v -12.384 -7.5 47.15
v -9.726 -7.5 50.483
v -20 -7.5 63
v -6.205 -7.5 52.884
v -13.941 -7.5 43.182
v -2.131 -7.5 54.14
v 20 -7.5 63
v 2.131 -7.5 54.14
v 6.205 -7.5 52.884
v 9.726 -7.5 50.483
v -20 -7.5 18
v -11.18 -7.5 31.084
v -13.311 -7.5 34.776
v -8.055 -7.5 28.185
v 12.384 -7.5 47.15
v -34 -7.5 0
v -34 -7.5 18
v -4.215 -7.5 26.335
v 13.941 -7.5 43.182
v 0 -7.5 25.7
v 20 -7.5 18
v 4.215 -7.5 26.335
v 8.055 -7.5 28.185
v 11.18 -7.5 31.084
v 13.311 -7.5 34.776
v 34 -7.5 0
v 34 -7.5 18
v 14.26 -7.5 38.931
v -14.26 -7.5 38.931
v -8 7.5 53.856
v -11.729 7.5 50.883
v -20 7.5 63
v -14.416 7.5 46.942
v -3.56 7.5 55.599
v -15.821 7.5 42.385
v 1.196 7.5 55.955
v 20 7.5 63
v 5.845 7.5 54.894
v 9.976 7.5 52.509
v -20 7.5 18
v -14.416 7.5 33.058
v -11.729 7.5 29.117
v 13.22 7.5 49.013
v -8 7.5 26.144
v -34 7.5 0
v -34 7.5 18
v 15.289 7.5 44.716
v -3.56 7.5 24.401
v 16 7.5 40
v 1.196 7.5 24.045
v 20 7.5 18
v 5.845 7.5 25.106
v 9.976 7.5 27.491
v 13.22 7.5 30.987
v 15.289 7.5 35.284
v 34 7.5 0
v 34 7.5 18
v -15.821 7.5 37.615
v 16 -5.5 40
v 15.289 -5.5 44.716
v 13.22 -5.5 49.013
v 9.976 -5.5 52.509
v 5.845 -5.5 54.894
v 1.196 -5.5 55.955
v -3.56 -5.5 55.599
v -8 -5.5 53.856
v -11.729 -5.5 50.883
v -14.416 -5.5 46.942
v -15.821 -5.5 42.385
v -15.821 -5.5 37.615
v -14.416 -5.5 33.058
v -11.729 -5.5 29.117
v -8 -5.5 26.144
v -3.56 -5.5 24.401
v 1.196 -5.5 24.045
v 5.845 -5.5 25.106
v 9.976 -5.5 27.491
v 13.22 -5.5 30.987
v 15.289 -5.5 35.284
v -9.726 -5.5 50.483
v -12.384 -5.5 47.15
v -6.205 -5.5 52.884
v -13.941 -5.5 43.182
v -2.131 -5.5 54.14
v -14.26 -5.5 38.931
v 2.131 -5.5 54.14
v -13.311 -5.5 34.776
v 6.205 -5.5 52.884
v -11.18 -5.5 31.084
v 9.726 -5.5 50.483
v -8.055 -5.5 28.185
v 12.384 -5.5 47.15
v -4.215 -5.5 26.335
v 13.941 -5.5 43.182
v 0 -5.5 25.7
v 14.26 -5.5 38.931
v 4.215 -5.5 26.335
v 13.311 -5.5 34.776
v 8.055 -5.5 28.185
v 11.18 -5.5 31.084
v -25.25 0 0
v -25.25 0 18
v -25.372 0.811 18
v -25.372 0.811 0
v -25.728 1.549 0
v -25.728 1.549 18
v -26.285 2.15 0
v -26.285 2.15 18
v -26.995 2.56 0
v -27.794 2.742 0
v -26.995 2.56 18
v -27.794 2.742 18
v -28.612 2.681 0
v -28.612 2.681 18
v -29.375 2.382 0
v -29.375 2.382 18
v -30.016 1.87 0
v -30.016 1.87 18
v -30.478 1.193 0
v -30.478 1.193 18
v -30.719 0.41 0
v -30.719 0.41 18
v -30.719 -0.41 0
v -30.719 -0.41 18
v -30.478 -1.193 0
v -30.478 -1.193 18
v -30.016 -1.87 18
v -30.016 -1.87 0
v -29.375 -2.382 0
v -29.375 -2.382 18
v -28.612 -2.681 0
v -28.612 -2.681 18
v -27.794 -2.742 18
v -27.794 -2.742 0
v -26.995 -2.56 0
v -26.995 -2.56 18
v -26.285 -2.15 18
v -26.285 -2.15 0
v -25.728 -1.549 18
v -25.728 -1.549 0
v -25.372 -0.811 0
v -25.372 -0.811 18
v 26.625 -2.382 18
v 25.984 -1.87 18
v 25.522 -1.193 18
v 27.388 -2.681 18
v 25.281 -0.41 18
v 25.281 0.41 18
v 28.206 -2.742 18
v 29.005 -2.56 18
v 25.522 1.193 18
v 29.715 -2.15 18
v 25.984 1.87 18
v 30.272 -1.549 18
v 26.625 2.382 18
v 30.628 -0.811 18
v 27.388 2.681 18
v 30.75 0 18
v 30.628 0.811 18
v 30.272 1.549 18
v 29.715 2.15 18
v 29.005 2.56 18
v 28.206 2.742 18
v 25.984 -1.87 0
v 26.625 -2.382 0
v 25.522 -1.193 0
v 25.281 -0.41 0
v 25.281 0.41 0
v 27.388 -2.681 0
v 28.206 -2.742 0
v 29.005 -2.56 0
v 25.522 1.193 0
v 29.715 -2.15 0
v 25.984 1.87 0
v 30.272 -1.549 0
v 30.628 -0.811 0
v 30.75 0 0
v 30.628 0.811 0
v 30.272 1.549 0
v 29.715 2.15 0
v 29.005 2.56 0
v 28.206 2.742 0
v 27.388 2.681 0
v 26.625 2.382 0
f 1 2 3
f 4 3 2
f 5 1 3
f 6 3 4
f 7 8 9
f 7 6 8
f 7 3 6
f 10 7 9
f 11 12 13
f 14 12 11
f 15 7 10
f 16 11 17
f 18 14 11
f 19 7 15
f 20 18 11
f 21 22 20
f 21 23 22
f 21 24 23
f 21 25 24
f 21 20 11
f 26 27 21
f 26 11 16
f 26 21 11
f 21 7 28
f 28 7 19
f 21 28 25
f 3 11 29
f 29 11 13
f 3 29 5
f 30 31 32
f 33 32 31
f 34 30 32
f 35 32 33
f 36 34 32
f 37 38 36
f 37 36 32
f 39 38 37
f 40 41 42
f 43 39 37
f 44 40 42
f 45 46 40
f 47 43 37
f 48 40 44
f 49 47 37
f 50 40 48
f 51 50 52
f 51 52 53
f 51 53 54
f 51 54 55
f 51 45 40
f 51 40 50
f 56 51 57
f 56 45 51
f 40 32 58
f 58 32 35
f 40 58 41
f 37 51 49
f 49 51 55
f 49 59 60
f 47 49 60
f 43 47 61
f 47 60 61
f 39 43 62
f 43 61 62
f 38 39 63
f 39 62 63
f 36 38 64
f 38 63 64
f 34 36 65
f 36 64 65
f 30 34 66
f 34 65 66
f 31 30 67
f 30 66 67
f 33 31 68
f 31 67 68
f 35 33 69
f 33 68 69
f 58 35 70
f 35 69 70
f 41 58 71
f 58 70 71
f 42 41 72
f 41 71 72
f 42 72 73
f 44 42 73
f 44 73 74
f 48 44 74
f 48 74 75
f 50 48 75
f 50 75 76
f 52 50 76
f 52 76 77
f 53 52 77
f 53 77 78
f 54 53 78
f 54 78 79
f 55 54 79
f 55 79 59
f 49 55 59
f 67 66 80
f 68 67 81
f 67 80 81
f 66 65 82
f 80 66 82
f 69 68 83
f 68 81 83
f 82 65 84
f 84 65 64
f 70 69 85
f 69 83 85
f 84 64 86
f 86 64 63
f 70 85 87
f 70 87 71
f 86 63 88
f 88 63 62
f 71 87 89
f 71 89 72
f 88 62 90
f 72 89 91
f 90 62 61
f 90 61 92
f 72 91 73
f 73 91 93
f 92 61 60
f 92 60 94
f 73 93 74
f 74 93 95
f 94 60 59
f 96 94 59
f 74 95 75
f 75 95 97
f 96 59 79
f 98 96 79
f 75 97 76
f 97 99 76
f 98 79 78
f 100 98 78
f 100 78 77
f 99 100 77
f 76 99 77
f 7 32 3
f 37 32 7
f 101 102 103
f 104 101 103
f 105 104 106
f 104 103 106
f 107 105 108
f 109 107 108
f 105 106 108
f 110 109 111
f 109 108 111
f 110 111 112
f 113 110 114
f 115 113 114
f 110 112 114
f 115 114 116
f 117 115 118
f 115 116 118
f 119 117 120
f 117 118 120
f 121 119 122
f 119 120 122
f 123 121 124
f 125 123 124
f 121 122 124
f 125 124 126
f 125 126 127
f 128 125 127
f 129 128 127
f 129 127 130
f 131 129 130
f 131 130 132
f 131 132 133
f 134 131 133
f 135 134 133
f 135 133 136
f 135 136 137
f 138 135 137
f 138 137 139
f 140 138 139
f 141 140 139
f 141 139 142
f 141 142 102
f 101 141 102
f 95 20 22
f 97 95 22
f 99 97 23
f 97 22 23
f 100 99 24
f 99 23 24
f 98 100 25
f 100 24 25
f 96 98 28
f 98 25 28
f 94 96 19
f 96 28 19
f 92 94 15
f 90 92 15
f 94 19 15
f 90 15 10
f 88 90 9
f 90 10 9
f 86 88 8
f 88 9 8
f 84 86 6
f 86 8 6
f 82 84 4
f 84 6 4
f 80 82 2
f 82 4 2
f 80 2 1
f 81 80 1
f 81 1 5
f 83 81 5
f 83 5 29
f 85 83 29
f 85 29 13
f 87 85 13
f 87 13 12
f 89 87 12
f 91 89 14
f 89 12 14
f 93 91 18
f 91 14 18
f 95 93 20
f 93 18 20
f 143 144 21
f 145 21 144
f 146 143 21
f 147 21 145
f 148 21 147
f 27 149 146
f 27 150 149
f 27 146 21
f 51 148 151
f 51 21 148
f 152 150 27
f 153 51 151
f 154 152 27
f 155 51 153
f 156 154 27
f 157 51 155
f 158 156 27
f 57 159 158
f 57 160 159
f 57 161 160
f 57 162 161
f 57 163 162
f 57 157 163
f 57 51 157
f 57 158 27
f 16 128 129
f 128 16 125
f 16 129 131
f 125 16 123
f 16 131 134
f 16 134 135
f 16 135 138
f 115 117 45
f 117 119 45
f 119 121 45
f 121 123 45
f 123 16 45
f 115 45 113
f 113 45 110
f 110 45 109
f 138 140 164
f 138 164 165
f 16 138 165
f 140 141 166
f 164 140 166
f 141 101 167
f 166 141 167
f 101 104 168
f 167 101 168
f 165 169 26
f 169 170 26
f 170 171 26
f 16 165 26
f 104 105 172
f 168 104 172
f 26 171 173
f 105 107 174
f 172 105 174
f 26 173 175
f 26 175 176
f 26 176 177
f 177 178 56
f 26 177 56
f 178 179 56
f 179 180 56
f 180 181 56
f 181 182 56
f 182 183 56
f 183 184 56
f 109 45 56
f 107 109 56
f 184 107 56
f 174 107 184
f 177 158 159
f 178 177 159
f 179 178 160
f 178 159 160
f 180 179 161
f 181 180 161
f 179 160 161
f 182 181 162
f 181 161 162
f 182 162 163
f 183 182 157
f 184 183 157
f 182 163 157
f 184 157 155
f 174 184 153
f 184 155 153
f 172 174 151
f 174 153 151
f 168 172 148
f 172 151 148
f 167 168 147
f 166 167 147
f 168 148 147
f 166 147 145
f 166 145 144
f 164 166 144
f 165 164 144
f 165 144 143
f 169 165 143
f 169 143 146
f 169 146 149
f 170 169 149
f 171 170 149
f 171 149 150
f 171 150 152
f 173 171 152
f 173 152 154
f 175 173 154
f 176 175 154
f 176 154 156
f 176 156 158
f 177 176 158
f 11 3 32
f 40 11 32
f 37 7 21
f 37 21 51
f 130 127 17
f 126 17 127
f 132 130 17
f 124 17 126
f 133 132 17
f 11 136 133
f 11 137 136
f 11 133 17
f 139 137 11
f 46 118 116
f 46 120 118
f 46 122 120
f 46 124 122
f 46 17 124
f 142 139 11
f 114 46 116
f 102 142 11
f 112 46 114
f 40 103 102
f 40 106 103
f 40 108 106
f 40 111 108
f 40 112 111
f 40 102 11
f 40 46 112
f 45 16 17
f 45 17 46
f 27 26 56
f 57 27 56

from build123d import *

# Parameters (mm, degrees)
SKETCH_1_W          = 68
SKETCH_1_H          = 15
EXTRUDE_1_DEPTH     = 18
SKETCH_2_W          = 40
SKETCH_2_H          = 15
EXTRUDE_2_DEPTH     = 45
SKETCH_3_R          = 16
CUT_EXTRUDE_1_DEPTH = 43
SKETCH_4_R          = 16
SKETCH_4_R_2        = 14.3
EXTRUDE_3_DEPTH     = 2
SKETCH_5_R          = 2.75
CUT_EXTRUDE_2_DEPTH = 21


with BuildPart() as part:
    # 草图1 → 凸台-拉伸1 (new body)
    with BuildSketch(Plane.XY):
        Rectangle(SKETCH_1_W, SKETCH_1_H)
    extrude(amount=EXTRUDE_1_DEPTH)

    # 草图2 → 凸台-拉伸2 (add)
    with BuildSketch(Plane.XY.offset(18)):
        Rectangle(SKETCH_2_W, SKETCH_2_H)
    extrude(amount=EXTRUDE_2_DEPTH)

    # 草图3 → 切除-拉伸1 (cut)
    with BuildSketch(Plane.XZ.offset(7.5)):
        with Locations((0, 40)):
            Circle(SKETCH_3_R)
    extrude(amount=-CUT_EXTRUDE_1_DEPTH, mode=Mode.SUBTRACT)

    # 草图4 → 凸台-拉伸3 (add)
    with BuildSketch(Plane.XZ.offset(7.5)):
        with Locations(Location((0, 40, 0), (0, 0, 270))):
            Circle(SKETCH_4_R)
        with Locations(Location((0, 40, 0), (0, 0, 270))):
            Circle(SKETCH_4_R_2, mode=Mode.SUBTRACT)
    extrude(amount=-EXTRUDE_3_DEPTH)

    # 草图5 → 切除-拉伸2 (cut)
    with BuildSketch(Plane.XY.offset(18)):
        with Locations((28, 0)):
            Circle(SKETCH_5_R)
        with Locations((-28, 0)):
            Circle(SKETCH_5_R)
    extrude(amount=-CUT_EXTRUDE_2_DEPTH, mode=Mode.SUBTRACT)


solid = part.part
